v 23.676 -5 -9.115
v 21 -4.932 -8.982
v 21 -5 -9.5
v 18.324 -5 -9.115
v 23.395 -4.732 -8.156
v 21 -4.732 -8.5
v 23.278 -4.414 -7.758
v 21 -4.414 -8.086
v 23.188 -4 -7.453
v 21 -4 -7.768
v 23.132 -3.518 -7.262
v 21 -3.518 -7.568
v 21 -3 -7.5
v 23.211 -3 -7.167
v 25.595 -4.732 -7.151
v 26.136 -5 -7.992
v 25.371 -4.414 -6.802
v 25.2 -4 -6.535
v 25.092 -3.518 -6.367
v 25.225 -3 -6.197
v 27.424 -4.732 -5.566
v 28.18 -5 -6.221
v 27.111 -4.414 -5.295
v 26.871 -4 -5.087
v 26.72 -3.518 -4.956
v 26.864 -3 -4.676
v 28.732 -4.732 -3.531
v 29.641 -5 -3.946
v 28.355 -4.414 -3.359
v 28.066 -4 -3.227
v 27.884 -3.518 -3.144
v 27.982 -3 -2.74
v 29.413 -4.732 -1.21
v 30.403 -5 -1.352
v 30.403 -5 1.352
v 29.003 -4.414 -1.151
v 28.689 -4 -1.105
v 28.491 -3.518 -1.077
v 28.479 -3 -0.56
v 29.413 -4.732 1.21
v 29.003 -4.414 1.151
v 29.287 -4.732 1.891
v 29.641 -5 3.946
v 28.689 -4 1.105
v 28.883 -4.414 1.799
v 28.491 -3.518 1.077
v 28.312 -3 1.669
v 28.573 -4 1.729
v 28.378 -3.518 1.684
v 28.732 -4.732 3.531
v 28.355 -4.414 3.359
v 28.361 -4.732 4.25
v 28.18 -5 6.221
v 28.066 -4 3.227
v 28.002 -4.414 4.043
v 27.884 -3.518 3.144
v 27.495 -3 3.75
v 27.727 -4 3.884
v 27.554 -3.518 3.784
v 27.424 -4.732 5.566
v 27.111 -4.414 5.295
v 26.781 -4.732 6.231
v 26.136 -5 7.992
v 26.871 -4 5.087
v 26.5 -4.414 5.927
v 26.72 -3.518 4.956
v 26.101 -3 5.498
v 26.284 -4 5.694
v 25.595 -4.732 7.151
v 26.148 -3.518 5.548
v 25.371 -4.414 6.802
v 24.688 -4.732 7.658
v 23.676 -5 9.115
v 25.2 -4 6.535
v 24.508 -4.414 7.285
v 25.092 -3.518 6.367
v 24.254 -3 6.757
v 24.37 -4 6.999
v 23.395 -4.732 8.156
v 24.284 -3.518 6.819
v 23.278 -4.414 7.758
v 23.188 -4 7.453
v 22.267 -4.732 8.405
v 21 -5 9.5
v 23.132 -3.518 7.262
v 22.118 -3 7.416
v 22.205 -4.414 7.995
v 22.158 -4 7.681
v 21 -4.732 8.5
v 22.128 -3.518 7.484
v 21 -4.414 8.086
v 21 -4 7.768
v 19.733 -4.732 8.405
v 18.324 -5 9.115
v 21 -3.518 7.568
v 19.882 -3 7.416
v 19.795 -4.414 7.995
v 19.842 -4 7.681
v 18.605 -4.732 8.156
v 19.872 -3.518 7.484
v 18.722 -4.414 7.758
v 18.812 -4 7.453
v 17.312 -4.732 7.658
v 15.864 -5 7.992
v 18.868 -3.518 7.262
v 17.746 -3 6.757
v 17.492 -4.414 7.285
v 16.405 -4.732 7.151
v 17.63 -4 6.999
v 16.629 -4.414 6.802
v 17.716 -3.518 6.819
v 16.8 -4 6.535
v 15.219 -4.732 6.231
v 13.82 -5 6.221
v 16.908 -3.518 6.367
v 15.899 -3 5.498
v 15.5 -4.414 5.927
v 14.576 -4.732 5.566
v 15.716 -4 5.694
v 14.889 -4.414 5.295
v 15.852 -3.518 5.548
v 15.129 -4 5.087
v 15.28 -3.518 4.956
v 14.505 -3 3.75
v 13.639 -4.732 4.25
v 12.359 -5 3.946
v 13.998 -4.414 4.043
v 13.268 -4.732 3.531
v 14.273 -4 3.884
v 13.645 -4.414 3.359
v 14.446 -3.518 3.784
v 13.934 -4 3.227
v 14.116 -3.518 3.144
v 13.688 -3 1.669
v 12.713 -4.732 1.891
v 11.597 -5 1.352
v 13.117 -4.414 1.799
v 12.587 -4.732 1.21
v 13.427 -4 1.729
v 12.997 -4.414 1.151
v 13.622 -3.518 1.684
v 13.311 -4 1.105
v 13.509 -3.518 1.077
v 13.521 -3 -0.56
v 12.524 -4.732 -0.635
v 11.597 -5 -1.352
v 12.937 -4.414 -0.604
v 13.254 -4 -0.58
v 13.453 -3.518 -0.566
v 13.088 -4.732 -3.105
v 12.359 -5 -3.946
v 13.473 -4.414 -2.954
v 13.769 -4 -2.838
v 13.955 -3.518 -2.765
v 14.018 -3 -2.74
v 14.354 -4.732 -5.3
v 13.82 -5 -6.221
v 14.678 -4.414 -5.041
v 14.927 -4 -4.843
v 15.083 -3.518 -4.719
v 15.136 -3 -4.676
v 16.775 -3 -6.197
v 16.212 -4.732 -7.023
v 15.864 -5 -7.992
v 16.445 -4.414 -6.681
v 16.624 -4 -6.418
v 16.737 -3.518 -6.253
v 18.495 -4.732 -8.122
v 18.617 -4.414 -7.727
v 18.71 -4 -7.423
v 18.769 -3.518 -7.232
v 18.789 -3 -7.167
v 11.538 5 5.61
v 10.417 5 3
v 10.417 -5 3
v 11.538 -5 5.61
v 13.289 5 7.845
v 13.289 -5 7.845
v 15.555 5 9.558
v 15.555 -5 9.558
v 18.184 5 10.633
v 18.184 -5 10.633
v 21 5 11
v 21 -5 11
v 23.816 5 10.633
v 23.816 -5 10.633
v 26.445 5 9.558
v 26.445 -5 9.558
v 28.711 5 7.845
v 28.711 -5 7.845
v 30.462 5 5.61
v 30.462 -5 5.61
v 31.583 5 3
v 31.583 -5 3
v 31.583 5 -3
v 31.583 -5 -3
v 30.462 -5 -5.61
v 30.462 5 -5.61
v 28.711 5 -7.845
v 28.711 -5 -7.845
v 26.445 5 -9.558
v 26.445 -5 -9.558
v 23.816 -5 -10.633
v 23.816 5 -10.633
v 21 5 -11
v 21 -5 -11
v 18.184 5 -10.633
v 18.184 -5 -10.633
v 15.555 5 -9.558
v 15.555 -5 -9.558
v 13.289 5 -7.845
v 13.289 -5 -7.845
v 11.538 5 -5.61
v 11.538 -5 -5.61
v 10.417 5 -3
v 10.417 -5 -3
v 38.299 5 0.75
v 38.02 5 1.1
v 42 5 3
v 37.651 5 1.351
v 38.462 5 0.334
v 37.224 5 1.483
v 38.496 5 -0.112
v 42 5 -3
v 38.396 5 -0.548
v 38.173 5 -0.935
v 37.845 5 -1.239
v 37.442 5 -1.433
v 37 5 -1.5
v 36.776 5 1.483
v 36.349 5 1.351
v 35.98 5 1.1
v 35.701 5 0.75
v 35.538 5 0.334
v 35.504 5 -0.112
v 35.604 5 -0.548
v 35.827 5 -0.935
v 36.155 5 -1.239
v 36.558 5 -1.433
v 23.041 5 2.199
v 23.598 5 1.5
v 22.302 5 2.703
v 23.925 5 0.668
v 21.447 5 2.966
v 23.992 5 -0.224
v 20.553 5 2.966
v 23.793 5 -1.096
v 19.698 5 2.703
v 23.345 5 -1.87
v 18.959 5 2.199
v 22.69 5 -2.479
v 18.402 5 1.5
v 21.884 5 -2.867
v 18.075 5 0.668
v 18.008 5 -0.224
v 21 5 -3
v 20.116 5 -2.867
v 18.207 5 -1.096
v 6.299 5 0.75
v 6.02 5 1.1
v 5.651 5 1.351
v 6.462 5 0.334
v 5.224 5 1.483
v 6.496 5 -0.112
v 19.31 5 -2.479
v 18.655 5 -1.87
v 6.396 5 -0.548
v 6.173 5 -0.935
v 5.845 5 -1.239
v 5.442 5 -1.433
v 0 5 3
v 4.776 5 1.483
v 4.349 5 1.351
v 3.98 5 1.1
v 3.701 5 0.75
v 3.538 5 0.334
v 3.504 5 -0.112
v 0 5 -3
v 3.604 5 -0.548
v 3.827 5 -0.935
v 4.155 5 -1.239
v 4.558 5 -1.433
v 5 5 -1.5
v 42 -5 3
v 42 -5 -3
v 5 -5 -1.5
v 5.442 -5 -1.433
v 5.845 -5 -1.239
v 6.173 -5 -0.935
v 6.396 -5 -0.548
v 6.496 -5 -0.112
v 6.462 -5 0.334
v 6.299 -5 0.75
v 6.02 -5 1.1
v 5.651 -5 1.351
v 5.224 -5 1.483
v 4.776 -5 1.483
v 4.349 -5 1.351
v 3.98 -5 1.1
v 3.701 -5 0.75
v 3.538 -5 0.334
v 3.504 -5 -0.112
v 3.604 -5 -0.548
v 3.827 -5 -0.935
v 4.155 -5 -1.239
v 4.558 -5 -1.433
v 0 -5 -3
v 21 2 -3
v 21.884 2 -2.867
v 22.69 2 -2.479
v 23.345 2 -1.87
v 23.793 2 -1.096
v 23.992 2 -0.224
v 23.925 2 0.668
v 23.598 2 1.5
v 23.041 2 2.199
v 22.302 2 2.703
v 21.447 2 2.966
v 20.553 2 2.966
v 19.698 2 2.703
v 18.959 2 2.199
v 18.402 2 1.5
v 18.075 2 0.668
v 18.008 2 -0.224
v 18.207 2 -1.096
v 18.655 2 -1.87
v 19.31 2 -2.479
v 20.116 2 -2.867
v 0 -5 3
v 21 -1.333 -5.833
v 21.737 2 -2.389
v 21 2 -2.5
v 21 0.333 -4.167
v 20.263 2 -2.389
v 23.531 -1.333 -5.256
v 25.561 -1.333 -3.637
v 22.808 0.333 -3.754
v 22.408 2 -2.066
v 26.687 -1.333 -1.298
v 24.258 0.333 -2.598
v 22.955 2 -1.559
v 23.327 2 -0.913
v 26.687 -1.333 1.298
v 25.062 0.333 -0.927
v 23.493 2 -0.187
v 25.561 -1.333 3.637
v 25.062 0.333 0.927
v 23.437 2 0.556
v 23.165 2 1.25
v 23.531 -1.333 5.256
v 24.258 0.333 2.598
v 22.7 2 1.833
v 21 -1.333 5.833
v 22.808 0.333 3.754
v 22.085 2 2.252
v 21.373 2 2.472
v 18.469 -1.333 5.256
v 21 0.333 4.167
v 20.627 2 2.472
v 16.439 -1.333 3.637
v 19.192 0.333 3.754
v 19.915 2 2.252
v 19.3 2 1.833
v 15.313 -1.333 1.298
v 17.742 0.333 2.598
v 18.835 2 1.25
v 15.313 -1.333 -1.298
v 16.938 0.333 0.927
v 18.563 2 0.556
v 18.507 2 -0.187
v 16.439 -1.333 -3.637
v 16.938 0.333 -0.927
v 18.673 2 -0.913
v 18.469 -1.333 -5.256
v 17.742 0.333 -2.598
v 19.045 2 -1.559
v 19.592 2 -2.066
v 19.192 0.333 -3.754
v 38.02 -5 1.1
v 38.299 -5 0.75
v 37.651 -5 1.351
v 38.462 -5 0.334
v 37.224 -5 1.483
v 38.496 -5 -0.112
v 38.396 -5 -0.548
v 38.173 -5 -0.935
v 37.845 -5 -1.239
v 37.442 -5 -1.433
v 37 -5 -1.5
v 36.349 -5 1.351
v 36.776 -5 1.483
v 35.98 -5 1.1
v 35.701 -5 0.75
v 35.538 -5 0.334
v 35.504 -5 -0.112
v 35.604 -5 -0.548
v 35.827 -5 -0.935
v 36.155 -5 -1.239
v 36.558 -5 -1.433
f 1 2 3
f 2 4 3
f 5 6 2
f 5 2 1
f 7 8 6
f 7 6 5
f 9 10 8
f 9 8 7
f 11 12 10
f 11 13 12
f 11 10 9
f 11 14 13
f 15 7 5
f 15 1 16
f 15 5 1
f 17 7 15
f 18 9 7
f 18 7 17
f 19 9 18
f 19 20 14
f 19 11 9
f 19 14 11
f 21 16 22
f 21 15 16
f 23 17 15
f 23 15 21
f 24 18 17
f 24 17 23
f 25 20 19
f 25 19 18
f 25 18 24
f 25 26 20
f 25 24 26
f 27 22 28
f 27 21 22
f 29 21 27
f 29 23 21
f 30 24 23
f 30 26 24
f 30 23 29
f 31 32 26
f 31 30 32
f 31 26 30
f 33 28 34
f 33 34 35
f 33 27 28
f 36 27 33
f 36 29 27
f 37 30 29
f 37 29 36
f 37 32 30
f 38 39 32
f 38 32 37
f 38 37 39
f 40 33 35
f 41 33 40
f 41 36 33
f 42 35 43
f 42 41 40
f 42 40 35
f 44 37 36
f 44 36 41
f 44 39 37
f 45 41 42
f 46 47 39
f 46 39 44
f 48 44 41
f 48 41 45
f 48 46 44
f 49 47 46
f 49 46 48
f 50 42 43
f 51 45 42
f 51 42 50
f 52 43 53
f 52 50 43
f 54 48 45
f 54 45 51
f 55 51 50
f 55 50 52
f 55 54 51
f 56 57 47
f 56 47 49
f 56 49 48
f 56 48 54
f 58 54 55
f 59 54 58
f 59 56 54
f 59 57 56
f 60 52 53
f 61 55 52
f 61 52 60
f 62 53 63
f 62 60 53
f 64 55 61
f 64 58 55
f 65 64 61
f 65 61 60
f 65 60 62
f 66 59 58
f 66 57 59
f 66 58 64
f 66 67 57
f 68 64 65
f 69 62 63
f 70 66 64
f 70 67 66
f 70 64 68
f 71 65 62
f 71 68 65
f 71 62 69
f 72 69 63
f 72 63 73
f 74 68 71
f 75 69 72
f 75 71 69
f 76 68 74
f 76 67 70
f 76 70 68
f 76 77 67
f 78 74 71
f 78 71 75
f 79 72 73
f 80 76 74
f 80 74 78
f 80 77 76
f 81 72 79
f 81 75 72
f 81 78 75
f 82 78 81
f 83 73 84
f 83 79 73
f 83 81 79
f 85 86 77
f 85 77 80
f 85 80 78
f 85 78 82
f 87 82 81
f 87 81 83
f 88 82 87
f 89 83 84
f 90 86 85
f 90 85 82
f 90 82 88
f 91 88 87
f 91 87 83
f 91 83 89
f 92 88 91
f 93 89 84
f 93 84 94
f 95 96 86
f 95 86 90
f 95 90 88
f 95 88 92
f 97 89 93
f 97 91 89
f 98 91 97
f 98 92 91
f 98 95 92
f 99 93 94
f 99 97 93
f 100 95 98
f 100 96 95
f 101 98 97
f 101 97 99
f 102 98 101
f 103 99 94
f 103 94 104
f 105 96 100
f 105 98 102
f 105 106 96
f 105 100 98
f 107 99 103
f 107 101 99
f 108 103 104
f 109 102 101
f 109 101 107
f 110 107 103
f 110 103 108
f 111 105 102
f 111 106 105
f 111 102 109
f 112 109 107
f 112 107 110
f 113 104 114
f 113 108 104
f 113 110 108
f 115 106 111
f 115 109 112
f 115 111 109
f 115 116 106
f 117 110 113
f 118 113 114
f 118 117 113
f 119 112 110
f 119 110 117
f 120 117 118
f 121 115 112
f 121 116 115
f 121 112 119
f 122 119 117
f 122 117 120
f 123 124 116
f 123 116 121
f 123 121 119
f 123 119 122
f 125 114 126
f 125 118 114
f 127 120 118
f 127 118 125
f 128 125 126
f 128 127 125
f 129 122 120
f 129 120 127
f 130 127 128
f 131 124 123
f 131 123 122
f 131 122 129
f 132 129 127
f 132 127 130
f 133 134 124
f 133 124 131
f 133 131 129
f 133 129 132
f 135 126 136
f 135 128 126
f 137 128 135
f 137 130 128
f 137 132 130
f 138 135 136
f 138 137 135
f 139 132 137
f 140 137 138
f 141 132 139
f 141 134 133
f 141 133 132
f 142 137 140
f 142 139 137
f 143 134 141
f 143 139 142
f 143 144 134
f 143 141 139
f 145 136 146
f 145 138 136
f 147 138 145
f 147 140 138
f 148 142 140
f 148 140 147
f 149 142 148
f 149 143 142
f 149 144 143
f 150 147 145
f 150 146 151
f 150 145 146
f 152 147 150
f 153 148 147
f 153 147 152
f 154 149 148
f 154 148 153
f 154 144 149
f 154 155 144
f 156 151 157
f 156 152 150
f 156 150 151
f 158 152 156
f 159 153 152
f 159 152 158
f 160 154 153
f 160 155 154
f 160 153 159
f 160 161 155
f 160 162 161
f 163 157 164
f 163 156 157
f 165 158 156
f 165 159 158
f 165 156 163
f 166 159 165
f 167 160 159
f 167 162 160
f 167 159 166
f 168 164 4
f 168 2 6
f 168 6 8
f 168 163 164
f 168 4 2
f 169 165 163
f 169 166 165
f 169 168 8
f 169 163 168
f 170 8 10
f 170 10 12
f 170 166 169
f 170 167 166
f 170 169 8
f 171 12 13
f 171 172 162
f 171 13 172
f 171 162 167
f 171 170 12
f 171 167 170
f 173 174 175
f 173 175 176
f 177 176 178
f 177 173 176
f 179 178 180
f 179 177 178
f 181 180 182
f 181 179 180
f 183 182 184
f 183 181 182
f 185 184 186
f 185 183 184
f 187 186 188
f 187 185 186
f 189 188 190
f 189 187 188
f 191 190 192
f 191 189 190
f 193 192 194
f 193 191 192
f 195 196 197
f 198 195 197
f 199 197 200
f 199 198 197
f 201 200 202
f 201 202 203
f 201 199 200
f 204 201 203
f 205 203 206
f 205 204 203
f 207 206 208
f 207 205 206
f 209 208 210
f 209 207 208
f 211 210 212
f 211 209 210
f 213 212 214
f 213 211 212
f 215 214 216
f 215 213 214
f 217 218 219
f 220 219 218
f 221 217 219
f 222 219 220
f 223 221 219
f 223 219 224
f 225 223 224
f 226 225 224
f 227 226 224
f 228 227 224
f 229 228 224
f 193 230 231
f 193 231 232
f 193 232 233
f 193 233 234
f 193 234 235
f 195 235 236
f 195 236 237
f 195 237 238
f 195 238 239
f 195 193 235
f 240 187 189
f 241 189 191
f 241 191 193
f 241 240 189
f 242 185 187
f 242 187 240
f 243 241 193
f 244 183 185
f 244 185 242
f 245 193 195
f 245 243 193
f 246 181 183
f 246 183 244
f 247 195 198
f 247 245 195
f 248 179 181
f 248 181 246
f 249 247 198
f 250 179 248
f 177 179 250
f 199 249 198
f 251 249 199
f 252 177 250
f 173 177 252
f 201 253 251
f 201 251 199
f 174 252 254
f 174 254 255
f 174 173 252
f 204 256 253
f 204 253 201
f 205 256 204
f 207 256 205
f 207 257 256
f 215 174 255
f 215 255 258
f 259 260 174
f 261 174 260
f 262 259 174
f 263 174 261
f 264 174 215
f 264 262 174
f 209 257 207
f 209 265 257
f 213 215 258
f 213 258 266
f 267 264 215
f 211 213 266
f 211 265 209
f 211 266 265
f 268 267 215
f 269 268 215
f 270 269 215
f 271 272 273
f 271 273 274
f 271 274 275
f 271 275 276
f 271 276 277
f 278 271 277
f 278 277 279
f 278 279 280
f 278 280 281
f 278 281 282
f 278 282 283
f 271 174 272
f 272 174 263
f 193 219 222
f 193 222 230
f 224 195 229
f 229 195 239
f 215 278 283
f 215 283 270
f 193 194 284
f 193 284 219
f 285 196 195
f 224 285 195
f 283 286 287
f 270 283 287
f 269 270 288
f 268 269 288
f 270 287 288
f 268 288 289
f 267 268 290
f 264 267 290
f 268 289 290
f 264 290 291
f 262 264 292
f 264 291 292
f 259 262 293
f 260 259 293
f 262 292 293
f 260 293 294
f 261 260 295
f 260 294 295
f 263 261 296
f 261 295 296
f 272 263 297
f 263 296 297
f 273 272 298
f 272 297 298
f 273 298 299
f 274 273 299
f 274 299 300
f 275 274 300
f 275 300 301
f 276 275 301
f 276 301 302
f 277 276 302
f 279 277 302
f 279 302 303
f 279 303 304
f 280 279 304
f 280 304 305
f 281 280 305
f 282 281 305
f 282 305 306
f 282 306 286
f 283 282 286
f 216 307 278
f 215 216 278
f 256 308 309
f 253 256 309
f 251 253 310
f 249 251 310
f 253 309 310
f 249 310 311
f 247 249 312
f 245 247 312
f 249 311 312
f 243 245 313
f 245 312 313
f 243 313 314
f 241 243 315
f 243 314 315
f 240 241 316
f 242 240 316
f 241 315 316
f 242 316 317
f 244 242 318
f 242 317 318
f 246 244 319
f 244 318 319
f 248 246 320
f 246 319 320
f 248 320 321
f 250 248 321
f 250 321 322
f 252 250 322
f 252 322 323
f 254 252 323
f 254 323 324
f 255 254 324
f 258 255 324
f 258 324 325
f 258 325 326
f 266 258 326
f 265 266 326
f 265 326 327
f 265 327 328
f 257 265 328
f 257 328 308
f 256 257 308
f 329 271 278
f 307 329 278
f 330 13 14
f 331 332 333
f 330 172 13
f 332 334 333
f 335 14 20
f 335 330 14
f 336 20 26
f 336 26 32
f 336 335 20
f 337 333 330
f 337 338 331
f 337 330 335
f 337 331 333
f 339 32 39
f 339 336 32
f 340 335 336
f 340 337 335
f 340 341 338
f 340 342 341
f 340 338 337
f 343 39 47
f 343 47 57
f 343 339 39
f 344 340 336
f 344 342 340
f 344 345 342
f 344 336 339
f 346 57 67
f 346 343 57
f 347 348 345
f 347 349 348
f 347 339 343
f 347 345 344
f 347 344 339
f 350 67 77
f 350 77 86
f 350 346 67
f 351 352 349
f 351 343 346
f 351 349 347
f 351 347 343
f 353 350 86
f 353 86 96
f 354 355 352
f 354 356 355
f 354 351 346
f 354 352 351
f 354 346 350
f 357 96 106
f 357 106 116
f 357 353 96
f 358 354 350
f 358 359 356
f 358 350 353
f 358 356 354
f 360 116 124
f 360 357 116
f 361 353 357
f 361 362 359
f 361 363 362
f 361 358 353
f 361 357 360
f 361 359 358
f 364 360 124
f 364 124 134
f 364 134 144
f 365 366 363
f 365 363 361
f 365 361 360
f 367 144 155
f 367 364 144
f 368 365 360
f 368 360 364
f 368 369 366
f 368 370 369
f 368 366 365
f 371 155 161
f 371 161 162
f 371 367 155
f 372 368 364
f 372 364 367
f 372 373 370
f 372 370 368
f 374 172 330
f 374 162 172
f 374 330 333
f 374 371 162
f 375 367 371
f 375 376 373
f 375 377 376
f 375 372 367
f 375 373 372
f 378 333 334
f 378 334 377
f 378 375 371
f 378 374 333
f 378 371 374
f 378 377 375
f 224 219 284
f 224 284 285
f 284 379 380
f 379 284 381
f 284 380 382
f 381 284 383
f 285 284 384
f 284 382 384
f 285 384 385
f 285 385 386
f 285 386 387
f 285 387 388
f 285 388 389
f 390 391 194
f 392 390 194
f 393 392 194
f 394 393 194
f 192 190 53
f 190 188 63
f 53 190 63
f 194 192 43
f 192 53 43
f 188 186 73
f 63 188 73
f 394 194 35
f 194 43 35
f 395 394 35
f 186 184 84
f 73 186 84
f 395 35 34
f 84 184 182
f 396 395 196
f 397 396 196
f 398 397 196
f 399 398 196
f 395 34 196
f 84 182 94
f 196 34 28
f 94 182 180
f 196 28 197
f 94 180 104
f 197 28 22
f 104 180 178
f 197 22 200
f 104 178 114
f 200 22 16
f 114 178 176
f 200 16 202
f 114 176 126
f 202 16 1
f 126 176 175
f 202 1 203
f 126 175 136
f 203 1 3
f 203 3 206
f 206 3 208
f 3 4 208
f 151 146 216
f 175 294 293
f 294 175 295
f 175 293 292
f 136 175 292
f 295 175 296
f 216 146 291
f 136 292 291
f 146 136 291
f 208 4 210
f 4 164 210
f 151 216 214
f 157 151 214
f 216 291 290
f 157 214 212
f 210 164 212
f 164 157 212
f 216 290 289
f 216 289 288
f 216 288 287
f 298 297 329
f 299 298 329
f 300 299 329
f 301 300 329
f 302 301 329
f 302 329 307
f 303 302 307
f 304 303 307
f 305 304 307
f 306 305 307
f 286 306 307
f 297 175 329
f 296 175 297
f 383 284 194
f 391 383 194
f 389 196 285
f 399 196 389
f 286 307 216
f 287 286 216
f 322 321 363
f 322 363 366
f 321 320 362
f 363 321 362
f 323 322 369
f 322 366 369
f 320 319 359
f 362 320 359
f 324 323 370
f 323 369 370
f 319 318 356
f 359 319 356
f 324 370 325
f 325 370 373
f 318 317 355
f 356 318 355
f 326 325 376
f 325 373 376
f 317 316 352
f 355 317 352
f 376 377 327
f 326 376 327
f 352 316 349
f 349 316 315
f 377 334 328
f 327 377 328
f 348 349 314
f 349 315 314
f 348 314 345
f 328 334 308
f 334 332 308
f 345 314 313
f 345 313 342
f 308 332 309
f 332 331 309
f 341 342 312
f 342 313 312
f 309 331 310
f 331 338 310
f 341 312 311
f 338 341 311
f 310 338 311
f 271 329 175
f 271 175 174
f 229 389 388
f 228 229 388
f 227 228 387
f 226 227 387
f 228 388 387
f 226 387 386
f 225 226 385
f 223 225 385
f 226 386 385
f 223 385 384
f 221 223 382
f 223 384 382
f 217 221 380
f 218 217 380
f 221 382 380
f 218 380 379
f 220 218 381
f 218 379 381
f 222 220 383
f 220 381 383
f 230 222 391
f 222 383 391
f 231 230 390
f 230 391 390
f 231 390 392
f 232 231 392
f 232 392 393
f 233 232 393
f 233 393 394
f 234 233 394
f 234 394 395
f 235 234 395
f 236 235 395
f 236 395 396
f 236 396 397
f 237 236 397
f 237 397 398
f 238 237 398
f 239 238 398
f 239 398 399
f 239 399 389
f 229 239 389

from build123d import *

# Parameters (mm, degrees)
SKETCH2_W           = 6
SKETCH2_H           = 10
BOSS_EXTRUDE1_DEPTH = 42
SKETCH3_R           = 11
BOSS_EXTRUDE2_DEPTH = 10
SKETCH4_R           = 7.5
CUT_EXTRUDE1_DEPTH  = 2
SKETCH6_R           = 3
CUT_EXTRUDE2_DEPTH  = 13
FILLET1_R           = 2
CUT_EXTRUDE3_REACH  = 46.553
SKETCH7_R           = 1.5


with BuildPart() as part:
    # Sketch2 → Boss-Extrude1 (new body)
    with BuildSketch(Plane(origin=(0, 0, 0), x_dir=(0, 0, -1), z_dir=(1, 0, 0))):
        Rectangle(SKETCH2_W, SKETCH2_H)
    extrude(amount=BOSS_EXTRUDE1_DEPTH)

    # Sketch3 → Boss-Extrude2 (add)
    with BuildSketch(Plane(origin=(0, 5, 0), x_dir=(1, 0, 0), z_dir=(0, 1, 0))):
        with Locations((21, 0)):
            Circle(SKETCH3_R)
    extrude(amount=-BOSS_EXTRUDE2_DEPTH)

    # Sketch4 → Cut-Extrude1 (cut)
    with BuildSketch(Plane(origin=(0, -5, 0), x_dir=(-1, 0, 0), z_dir=(0, -1, 0))):
        with Locations(Location((-21, 0, 0), (0, 0, 90))):
            Circle(SKETCH4_R)
    extrude(amount=-CUT_EXTRUDE1_DEPTH, mode=Mode.SUBTRACT)

    # Sketch5 → Cut-Revolve1 (revolve, cut)
    with BuildSketch(Plane(origin=(0, 0, 0), x_dir=(-1, 0, 0), z_dir=(0, 0, -1)), mode=Mode.PRIVATE) as cut_revolve1_sk:
        Polygon((-21, -3), (-28.5, -3), (-23.5, 2), (-21, 2), align=None)
    revolve(cut_revolve1_sk.sketch.rotate(Axis((21, 2, 0), (0, -1, 0)), 270), axis=Axis((21, 2, 0), (0, -1, 0)), mode=Mode.SUBTRACT)

    # Sketch6 → Cut-Extrude2 (cut)
    with BuildSketch(Plane.XZ.offset(-2)):
        with Locations(Location((21, 0, 0), (0, 0, 270))):
            Circle(SKETCH6_R)
    extrude(amount=-CUT_EXTRUDE2_DEPTH, mode=Mode.SUBTRACT)

    # Fillet1
    fillet1_edges = [part.edges().sort_by_distance(p)[0] for p in [
        (21, -5, 7.5),
    ]]
    fillet(fillet1_edges, radius=FILLET1_R - 0.0001)  # a hair under: the kernel refuses the full size

    # Sketch7 → Cut-Extrude3 (cut, up to next)
    with BuildSketch(Plane.XZ.offset(5), mode=Mode.PRIVATE) as cut_extrude3_sk1:
        with Locations(Location((5, 0, 0), (0, 0, 270))):
            Circle(SKETCH7_R)
    cut_extrude3_tool1 = extrude(cut_extrude3_sk1.sketch, amount=-CUT_EXTRUDE3_REACH, mode=Mode.PRIVATE) & part.part
    # Sketch7 → Cut-Extrude3 (cut, up to next)
    with BuildSketch(Plane.XZ.offset(5), mode=Mode.PRIVATE) as cut_extrude3_sk2:
        with Locations(Location((37, 0, 0), (0, 0, 270))):
            Circle(SKETCH7_R)
    cut_extrude3_tool2 = extrude(cut_extrude3_sk2.sketch, amount=-CUT_EXTRUDE3_REACH, mode=Mode.PRIVATE) & part.part
    add(cut_extrude3_tool1.solids().sort_by_distance((5, -5, 0))[0], mode=Mode.SUBTRACT)
    add(cut_extrude3_tool2.solids().sort_by_distance((37, -5, 0))[0], mode=Mode.SUBTRACT)


solid = part.part
